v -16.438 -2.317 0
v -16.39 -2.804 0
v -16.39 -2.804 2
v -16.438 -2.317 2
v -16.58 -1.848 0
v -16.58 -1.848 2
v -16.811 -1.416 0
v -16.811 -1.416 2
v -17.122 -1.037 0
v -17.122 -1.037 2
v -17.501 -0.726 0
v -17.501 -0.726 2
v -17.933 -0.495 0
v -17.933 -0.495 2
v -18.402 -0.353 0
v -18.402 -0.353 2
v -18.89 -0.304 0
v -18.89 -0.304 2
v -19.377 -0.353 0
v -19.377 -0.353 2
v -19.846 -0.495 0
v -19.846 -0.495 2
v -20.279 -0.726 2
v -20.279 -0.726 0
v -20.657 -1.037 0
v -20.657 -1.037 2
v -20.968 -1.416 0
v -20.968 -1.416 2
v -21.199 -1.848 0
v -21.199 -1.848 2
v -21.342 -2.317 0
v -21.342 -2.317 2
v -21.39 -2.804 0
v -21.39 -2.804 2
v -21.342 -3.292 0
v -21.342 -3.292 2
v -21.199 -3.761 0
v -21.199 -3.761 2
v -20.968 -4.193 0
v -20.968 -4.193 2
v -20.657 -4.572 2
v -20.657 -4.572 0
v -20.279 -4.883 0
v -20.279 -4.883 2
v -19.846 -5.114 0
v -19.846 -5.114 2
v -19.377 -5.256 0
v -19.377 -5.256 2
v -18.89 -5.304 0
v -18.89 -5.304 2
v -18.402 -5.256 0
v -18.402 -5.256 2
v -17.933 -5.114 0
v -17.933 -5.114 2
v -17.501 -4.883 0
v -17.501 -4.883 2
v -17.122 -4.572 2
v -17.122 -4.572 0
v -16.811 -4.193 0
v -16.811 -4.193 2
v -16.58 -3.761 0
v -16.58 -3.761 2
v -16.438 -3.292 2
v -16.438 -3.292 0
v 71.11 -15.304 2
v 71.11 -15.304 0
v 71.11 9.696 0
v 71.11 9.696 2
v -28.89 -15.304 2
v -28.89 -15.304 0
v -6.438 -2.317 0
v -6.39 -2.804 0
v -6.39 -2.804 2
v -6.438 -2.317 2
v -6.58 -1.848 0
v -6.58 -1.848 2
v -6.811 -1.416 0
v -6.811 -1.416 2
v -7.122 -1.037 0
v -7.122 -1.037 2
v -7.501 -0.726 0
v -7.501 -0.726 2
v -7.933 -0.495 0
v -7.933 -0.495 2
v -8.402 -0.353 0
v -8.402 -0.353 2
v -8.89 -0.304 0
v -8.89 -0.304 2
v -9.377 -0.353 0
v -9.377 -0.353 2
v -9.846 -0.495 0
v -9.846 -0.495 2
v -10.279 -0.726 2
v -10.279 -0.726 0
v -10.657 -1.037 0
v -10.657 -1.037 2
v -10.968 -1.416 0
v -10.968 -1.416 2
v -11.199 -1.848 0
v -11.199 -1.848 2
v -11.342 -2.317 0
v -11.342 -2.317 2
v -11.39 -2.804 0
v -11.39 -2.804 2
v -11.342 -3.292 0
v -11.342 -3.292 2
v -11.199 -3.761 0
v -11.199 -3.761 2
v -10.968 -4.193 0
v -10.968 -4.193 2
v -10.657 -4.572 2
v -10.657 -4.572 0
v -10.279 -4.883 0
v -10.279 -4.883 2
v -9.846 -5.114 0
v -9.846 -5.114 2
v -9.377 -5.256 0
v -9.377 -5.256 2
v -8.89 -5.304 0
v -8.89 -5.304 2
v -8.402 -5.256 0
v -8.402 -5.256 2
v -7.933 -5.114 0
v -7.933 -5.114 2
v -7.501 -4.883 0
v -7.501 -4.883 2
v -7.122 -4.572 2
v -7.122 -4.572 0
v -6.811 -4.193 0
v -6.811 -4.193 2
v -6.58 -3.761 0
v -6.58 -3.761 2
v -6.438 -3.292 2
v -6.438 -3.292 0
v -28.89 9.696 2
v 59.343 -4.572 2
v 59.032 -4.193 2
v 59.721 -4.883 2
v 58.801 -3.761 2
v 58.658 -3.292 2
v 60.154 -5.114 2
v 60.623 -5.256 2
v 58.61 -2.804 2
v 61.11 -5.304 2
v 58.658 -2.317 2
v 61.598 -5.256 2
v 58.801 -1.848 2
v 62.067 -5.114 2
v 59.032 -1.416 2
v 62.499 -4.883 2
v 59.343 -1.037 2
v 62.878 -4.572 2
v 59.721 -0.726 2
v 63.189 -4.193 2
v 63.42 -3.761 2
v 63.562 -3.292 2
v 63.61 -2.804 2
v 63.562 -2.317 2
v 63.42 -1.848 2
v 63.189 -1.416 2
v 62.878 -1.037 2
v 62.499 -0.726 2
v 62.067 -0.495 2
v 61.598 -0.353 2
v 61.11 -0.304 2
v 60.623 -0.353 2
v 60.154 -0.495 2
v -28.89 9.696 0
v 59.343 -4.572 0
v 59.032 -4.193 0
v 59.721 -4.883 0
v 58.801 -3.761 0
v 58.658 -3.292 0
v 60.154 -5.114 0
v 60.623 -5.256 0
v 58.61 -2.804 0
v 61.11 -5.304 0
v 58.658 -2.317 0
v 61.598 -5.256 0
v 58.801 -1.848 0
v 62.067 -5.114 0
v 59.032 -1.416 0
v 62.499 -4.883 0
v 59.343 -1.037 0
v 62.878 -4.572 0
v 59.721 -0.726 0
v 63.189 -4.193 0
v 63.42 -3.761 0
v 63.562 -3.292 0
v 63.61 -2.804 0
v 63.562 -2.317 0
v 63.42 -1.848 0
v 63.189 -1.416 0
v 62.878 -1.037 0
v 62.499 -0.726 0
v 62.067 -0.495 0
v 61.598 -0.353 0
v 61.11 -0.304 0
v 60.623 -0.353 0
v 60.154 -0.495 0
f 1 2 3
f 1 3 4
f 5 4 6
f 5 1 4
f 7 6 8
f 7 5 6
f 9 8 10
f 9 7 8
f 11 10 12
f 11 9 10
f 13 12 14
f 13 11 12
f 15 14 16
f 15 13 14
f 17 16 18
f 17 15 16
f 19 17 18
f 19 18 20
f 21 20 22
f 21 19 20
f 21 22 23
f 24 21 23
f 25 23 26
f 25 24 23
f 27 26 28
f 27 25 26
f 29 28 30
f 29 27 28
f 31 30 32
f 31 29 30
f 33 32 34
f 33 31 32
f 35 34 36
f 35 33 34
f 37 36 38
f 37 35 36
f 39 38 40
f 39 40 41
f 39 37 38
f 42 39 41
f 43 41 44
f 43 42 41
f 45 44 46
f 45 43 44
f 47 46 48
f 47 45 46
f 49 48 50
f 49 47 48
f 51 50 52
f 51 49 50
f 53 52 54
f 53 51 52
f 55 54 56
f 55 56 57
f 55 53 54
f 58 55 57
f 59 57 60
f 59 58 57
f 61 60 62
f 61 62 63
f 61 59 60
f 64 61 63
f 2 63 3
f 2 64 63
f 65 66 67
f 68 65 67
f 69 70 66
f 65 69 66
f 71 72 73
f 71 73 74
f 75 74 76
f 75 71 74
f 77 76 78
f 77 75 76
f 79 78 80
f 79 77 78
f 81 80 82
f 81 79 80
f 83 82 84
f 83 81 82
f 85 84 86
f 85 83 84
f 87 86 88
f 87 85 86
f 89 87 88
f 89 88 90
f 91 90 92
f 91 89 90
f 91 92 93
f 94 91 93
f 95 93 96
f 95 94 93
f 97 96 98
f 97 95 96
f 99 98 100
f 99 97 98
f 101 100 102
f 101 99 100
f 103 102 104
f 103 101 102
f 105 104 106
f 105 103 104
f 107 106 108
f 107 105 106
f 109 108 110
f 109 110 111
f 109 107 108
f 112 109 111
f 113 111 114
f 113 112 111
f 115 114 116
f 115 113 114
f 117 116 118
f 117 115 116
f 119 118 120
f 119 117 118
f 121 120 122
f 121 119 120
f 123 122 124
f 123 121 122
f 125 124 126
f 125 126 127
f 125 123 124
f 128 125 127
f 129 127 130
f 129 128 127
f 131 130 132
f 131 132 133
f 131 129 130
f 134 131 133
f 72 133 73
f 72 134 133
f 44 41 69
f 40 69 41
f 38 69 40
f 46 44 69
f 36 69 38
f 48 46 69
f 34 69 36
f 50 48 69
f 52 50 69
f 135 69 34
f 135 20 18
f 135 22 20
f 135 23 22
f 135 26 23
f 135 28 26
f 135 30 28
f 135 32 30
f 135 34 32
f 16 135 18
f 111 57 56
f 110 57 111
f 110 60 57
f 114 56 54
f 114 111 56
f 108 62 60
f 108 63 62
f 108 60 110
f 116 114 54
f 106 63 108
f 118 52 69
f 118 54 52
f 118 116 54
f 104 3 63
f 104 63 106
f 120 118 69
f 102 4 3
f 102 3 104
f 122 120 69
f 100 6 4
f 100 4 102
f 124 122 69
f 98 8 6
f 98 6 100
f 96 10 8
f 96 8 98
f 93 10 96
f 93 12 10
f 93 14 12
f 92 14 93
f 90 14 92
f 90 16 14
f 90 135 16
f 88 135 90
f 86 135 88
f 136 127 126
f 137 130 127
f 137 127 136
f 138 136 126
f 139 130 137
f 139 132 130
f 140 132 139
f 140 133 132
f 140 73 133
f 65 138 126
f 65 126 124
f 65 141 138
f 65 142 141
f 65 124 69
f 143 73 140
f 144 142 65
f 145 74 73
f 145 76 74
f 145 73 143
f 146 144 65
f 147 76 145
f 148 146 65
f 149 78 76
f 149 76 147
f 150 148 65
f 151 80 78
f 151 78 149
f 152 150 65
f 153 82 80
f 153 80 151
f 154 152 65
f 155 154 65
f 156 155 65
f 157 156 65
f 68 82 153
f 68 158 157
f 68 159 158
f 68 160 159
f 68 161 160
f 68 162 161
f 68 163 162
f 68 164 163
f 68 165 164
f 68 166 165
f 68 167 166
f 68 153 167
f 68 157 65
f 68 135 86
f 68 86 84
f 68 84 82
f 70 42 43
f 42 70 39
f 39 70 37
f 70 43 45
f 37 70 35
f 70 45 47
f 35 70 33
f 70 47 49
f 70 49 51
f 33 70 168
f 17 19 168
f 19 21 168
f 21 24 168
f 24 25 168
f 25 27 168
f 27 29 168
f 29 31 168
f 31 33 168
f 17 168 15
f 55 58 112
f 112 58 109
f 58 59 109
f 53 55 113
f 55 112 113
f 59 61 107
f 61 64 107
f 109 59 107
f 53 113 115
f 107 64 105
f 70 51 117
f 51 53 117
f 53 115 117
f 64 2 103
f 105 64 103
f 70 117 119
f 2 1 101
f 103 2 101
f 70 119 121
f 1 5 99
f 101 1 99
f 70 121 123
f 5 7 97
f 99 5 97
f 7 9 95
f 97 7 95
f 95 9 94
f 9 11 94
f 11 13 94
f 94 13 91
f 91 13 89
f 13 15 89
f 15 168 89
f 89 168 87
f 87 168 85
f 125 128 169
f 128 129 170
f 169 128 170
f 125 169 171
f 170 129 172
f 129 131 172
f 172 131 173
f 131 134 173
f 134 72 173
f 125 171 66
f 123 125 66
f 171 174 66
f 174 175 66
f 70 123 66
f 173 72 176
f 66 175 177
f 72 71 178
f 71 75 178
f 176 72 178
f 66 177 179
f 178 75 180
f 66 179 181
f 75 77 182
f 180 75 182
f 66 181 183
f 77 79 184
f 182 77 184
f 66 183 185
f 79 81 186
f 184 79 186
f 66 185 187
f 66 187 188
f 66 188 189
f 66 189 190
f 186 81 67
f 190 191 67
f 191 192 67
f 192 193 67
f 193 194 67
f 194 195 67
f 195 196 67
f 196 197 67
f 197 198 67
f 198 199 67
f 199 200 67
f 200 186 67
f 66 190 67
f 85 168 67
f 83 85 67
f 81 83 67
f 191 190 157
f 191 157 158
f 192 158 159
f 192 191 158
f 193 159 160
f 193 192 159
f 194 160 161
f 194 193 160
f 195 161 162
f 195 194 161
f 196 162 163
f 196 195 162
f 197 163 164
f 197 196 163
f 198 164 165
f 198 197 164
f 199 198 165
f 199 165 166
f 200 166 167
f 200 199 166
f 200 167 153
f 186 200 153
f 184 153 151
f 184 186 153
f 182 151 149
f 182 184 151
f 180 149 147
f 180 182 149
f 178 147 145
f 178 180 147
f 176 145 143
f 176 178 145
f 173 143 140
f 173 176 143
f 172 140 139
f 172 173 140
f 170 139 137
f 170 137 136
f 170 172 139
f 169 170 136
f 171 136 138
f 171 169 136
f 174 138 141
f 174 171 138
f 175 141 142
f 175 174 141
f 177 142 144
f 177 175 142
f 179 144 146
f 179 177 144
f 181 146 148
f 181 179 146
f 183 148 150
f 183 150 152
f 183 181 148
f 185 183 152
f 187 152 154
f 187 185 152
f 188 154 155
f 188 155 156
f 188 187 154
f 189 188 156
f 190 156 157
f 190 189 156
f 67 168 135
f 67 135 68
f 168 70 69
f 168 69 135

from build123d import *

# Parameters (mm, degrees)
ESBO_O1_W                = 100
ESBO_O1_H                = 25
ESBO_O1_R                = 2.5
RESSALTO_EXTRUS_O1_DEPTH = 2


with BuildPart() as part:
    # Esboço1 → Ressalto-extrusão1 (new body)
    with BuildSketch(Plane.XY):
        with Locations((21.110395733, -2.804487179)):
            Rectangle(ESBO_O1_W, ESBO_O1_H)
        with Locations((-18.889604267, -2.804487179)):
            Circle(ESBO_O1_R, mode=Mode.SUBTRACT)
        with Locations((-8.889604267, -2.804487179)):
            Circle(ESBO_O1_R, mode=Mode.SUBTRACT)
        with Locations((61.110395733, -2.804487179)):
            Circle(ESBO_O1_R, mode=Mode.SUBTRACT)
    extrude(amount=RESSALTO_EXTRUS_O1_DEPTH)


solid = part.part
